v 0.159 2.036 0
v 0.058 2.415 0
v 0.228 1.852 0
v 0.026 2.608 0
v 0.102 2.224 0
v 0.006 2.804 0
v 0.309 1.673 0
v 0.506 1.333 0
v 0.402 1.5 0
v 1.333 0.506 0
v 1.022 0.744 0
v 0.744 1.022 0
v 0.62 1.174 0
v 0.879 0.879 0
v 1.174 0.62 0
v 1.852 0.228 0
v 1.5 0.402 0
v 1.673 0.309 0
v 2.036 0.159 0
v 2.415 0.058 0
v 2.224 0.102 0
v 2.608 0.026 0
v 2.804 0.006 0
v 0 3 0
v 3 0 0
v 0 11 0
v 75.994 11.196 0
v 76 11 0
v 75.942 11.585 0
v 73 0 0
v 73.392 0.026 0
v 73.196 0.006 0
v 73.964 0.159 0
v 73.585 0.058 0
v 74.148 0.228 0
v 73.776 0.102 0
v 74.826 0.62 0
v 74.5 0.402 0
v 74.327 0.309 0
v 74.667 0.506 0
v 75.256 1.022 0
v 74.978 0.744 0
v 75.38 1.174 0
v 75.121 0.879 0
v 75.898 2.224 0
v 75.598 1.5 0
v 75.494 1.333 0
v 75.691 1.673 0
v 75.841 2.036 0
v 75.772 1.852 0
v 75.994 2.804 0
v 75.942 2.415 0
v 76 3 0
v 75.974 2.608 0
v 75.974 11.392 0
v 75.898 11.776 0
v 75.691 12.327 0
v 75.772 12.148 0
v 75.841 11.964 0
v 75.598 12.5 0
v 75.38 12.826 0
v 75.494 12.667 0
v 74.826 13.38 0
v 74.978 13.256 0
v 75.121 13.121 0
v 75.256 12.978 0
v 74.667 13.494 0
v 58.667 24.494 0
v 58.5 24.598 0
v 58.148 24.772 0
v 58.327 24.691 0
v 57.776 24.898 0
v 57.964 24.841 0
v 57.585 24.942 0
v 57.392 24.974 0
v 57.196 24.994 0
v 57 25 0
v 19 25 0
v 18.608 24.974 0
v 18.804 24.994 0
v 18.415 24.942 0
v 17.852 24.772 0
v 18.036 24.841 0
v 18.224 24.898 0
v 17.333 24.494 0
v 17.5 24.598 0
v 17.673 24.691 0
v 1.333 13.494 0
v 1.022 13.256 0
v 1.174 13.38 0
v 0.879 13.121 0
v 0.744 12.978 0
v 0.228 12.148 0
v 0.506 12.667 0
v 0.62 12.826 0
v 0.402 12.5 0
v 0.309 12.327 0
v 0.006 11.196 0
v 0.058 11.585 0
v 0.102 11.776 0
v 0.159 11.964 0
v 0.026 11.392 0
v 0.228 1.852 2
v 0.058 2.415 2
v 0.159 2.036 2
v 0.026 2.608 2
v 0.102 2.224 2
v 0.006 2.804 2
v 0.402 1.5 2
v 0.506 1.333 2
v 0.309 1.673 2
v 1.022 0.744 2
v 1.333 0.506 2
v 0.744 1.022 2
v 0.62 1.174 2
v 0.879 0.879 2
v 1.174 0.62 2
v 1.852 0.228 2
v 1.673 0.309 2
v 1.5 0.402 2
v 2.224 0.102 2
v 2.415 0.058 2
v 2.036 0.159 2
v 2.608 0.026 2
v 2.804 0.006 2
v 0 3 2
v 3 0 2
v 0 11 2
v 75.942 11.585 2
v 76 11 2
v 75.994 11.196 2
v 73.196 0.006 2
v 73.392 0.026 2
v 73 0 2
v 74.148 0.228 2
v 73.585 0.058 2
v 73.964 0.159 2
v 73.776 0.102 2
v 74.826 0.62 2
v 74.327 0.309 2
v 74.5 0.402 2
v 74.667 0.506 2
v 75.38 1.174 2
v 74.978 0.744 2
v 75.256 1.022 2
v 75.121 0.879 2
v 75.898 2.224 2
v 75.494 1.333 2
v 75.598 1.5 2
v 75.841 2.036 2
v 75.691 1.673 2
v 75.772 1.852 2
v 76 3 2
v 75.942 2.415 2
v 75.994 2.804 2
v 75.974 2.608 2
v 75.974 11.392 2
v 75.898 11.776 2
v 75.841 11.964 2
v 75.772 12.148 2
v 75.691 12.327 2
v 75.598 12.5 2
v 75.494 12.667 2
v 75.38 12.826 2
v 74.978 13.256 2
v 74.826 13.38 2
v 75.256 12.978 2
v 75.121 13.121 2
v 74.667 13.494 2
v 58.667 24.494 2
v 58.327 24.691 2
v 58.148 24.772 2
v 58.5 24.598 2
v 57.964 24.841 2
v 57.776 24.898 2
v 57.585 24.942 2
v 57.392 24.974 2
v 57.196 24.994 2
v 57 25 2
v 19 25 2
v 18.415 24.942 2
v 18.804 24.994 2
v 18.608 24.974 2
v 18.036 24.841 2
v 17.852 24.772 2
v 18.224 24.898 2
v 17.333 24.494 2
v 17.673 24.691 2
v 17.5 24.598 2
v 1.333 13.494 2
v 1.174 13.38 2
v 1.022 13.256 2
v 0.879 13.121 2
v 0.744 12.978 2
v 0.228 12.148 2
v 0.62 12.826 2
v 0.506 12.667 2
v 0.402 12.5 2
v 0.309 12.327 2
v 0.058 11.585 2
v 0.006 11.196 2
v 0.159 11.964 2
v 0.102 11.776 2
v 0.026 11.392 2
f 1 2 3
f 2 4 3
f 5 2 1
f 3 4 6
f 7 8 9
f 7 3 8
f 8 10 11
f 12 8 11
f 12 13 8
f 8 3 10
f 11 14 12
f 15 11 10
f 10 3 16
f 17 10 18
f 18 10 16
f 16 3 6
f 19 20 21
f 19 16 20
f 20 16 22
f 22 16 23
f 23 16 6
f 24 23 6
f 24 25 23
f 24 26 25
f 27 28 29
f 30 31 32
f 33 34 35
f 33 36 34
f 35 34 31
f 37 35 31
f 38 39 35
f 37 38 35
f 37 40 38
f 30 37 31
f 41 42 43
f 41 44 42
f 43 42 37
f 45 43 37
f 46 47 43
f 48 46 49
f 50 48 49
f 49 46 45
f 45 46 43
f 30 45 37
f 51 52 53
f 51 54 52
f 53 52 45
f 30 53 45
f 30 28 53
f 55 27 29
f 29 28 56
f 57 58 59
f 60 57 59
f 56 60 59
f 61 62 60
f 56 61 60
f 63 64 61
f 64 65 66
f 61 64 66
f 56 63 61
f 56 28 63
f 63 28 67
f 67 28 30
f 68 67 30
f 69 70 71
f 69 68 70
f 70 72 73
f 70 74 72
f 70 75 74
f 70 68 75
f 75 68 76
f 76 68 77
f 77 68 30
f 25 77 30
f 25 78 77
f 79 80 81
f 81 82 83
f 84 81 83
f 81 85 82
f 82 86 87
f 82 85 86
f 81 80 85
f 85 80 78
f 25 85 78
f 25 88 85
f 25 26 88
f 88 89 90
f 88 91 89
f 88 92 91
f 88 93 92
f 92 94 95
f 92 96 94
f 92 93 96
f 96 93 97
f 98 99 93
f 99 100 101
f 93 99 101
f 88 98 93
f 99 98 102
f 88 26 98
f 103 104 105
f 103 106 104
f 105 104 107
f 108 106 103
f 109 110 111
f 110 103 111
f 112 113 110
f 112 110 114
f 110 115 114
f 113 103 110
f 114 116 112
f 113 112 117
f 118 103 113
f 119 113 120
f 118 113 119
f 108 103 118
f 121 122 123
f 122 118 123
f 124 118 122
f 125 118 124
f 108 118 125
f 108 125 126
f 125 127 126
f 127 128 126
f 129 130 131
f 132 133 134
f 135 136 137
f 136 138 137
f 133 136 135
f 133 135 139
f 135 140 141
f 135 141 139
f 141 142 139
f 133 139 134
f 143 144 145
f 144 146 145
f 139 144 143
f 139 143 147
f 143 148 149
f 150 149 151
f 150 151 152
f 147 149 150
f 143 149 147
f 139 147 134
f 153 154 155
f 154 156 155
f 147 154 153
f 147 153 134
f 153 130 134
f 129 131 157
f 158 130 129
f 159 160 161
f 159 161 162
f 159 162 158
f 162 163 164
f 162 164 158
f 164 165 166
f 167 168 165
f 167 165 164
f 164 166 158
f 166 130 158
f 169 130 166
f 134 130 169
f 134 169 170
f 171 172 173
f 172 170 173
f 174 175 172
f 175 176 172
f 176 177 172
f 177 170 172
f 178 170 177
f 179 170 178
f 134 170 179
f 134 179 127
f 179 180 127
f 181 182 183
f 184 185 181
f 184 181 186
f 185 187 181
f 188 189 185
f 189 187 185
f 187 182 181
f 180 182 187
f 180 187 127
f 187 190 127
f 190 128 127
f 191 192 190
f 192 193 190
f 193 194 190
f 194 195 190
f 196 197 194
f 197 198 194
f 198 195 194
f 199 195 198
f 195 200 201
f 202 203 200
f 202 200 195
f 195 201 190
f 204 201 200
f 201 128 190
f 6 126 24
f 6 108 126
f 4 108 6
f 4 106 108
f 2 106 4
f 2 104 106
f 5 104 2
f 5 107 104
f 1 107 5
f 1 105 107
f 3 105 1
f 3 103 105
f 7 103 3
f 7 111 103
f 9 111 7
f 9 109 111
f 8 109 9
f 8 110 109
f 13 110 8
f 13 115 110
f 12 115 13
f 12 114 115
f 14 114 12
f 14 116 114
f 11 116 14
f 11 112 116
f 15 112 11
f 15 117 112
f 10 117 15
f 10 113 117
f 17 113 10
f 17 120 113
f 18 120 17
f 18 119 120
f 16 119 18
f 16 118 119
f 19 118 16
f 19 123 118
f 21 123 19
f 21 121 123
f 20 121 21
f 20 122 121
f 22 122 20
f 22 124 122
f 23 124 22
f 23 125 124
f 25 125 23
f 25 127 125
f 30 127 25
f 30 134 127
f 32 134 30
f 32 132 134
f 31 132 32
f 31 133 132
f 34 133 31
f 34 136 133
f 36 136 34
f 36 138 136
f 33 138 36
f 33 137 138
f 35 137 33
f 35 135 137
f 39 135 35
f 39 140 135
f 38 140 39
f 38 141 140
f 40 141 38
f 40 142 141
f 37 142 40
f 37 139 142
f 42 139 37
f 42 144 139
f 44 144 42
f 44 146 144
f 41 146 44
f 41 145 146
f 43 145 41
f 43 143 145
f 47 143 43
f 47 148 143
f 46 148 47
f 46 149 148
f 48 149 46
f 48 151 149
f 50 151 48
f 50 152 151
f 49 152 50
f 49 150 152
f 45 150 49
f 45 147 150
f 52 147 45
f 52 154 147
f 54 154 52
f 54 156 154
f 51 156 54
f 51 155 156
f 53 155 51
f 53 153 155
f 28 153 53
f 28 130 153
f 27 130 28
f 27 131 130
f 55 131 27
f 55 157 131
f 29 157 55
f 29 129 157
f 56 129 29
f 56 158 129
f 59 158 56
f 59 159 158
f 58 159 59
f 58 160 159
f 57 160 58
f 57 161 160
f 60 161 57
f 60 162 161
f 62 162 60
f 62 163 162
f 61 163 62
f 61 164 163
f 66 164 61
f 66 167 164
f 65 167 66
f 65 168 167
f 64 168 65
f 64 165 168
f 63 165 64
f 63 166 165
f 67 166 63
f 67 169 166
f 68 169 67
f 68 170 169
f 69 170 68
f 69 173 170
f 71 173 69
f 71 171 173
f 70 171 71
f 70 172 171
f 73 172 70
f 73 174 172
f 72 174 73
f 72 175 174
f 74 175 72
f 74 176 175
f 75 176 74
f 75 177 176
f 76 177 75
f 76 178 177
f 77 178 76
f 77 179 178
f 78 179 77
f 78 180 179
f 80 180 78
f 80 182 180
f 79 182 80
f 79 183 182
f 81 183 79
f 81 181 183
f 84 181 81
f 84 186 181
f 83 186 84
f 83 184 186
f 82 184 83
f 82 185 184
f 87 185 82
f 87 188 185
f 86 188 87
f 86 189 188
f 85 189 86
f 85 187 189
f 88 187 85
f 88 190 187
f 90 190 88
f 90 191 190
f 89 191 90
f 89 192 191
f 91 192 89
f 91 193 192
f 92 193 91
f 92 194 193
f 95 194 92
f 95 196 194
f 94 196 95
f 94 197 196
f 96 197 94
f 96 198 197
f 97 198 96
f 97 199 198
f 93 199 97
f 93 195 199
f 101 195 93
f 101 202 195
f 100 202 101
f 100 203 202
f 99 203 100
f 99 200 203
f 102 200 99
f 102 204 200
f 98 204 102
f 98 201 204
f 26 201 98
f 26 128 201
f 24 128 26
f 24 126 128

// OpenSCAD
// Simple glider.

// Copyright (C) 2015 Embecosm Limited (www.embecosm.com)

// Contributor: Jeremy Bennett <jeremy.bennett@embecosm.com>

// This file is licensed under the Creative Commons Attribution-ShareAlike 3.0
// Unported License. To view a copy of this license, visit
// http://creativecommons.org/licenses/by-sa/3.0/ or send a letter to Creative
// Commons, PO Box 1866, Mountain View, CA 94042, USA.


// A very simple hand thrown glider for indoor use.

// This is the tail wing.  Print with very low fill density in something like
// HIPS for low weight.


// Useful constants
corner_r =  3;
wing_z   =  2;
max_x    = 76;
min_x    = 38;
x_off    = (max_x - min_x) / 2;
max_y    = 25;
min_y    = 14;

// Smooth corners
$fn      = 96;

// 2D outline, which we'll later extrude.
module tailwing_2d () {
    hull () {
        translate (v = [corner_r, corner_r, 0])
            circle (r = corner_r);
        translate (v = [max_x - corner_r, corner_r, 0])
            circle (r = corner_r);
        translate (v = [max_x - corner_r, min_y - corner_r, 0])
            circle (r = corner_r);
        translate (v = [min_x + x_off, max_y - corner_r, 0])
            circle (r = corner_r);
        translate (v = [x_off, max_y - corner_r, 0])
            circle (r = corner_r);
        translate (v = [corner_r, min_y - corner_r, 0])
            circle (r = corner_r);
    }
}


// 3D tailwing
module tailwing () {
    linear_extrude (height = wing_z, slices = 1, convexity = 1)
        tailwing_2d ();
}


tailwing ();
